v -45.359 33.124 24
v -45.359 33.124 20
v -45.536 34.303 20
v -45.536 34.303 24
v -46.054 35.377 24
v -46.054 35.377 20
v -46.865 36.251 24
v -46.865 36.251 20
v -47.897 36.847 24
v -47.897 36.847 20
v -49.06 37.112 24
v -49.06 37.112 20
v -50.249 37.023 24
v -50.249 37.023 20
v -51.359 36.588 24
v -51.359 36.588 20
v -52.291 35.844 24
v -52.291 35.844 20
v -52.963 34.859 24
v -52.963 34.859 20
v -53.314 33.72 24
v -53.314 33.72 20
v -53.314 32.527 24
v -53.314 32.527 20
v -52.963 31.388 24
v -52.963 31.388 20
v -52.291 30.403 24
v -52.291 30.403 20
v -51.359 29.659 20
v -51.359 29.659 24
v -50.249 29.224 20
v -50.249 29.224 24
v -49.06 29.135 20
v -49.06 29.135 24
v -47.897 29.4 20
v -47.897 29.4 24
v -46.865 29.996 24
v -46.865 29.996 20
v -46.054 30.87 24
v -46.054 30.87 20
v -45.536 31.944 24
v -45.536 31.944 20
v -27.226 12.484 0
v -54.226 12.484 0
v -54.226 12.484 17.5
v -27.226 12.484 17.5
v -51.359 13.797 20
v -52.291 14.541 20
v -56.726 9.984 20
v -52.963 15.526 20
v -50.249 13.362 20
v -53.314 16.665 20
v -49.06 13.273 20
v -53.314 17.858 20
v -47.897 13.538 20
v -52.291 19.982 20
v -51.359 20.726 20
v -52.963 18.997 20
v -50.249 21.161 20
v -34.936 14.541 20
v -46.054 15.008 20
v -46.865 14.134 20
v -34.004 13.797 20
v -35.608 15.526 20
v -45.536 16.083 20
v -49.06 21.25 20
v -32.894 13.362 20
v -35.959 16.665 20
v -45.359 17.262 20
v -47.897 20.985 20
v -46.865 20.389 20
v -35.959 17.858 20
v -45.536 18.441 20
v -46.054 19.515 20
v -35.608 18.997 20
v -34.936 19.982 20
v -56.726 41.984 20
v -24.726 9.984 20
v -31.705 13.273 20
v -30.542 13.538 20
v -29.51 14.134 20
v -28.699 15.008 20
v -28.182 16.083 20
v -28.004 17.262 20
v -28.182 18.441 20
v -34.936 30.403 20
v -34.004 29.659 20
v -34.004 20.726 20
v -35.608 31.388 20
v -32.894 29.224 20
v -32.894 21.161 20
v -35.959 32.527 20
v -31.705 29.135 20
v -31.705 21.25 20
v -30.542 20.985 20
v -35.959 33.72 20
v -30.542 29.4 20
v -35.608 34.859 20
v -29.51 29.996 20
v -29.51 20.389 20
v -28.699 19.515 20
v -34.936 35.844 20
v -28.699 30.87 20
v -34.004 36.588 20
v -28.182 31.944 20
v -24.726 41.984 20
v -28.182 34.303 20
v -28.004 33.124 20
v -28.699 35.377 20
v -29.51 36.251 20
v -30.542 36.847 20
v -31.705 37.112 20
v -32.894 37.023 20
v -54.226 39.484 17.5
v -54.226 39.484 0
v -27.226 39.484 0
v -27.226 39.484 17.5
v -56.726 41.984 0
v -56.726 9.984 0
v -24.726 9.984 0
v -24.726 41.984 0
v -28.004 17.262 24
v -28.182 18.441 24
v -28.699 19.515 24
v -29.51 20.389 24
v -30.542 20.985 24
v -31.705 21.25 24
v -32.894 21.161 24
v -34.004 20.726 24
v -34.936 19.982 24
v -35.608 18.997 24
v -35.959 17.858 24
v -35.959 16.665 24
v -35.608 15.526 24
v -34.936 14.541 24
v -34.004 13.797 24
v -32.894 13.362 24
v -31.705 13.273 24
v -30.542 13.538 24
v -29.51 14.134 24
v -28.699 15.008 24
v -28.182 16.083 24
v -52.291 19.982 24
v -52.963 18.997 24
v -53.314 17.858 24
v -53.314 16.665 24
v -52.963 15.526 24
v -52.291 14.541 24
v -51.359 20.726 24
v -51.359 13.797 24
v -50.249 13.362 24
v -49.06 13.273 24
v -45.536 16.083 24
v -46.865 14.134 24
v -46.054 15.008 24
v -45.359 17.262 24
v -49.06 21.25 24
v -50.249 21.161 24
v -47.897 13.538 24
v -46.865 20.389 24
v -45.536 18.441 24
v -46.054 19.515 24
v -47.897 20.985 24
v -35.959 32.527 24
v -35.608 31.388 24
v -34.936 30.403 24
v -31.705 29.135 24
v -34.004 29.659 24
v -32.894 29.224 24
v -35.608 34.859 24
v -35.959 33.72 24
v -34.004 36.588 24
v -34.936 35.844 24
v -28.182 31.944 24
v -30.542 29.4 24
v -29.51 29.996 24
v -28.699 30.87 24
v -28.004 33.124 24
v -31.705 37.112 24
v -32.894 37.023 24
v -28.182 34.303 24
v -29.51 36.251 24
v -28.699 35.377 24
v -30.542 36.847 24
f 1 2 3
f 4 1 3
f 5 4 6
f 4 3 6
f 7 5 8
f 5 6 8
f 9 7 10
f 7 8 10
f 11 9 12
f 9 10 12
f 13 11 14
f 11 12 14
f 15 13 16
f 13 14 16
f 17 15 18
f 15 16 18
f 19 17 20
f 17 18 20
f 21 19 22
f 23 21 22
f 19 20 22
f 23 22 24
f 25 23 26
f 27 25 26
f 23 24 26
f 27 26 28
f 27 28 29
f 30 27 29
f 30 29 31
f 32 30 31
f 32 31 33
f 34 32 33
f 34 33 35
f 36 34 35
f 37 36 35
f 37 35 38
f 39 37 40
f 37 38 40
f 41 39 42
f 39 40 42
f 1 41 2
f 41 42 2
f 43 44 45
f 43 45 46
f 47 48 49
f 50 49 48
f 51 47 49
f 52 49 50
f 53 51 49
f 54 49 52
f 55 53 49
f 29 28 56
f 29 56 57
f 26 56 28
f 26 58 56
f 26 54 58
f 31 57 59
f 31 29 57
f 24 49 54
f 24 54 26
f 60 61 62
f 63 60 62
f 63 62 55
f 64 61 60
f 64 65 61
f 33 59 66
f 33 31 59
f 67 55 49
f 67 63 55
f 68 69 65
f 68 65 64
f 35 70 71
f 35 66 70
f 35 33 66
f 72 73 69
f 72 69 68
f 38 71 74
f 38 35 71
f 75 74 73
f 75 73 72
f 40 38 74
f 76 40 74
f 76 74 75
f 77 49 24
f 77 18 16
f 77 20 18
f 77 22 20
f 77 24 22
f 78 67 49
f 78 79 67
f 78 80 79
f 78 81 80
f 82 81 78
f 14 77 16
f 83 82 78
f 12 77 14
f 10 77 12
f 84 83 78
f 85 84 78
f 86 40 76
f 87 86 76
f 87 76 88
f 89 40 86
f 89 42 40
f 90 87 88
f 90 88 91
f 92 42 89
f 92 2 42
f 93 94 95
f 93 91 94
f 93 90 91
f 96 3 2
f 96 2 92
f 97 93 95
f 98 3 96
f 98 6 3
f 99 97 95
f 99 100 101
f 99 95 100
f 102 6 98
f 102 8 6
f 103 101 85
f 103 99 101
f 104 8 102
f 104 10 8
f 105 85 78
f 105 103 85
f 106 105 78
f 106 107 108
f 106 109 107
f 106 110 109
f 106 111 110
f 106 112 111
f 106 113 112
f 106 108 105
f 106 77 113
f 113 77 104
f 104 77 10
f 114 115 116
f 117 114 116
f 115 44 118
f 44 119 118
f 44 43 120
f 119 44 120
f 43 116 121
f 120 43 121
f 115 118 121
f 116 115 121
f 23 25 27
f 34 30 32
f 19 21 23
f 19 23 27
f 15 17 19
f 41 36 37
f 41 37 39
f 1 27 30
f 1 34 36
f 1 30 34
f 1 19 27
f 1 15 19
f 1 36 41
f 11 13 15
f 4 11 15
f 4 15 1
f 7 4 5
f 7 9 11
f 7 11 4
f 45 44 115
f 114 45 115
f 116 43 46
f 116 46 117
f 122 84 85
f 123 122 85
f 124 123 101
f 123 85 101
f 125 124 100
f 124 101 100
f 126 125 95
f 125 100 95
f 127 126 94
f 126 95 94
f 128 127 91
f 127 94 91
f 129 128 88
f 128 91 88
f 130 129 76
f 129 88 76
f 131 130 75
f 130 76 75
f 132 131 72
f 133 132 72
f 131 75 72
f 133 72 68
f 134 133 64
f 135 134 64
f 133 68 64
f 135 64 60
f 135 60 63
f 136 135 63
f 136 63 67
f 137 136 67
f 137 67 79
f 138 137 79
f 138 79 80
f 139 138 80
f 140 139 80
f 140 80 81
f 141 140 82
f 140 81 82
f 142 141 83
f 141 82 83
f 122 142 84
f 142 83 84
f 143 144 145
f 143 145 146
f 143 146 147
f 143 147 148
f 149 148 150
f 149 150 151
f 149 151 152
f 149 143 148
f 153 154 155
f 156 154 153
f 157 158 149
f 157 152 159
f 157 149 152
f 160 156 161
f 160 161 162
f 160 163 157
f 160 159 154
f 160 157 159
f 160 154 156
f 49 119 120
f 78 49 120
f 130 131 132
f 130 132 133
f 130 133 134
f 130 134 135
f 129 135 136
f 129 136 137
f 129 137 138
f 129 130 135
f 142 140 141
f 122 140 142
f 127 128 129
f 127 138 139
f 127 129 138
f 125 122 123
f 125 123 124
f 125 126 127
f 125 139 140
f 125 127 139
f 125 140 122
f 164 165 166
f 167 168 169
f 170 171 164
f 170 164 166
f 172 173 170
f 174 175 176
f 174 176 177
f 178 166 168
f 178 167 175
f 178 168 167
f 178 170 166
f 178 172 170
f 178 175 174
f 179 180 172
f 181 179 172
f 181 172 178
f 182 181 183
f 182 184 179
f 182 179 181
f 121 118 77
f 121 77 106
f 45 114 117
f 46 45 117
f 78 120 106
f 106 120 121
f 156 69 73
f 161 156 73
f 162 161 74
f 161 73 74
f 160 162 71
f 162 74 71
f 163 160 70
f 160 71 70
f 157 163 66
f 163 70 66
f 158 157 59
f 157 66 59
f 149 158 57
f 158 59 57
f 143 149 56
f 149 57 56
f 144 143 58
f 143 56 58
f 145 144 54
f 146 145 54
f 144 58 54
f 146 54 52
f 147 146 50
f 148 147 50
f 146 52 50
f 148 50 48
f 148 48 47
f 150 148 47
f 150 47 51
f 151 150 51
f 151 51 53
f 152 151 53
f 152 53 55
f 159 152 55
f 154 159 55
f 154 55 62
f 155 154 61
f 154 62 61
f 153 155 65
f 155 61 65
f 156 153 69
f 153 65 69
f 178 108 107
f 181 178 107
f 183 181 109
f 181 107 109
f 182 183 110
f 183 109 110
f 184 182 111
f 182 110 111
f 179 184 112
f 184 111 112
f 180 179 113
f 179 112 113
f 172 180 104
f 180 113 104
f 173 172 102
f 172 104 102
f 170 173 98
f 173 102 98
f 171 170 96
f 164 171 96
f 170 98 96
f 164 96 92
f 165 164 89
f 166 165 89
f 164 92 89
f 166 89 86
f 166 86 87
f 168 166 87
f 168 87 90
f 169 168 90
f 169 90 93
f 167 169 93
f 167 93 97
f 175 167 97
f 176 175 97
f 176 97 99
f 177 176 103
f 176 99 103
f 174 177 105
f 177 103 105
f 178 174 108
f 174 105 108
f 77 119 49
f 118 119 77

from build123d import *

# Parameters (mm, degrees)
F0_W     = 32
F0_H     = 32
F1_DEPTH = 20
F2_T     = -2.5
F3_R     = 4
F4_DEPTH = 4


with BuildPart() as f1:
    # F0 (on Top) → F1 (new body)
    with BuildSketch(Plane.XY):
        with Locations((-40.726009, 25.983708)):
            Rectangle(F0_W, F0_H)
    extrude(amount=F1_DEPTH)

    # F2
    f2_openings = [f1.faces().sort_by_distance(p)[0] for p in [
        (-40.726009, 25.983708, 0),
    ]]
    offset(amount=F2_T, openings=f2_openings)

    # F3 (on face) → F4 (join)
    with BuildSketch(Plane.XY.offset(20)):
        with Locations((-49.358711, 33.123519)):
            Circle(F3_R)
        with Locations((-49.358711, 17.261552)):
            Circle(F3_R)
        with Locations((-32.003853, 17.261552)):
            Circle(F3_R)
        with Locations((-32.003853, 33.123519)):
            Circle(F3_R)
    extrude(amount=F4_DEPTH)


solid = f1.part
